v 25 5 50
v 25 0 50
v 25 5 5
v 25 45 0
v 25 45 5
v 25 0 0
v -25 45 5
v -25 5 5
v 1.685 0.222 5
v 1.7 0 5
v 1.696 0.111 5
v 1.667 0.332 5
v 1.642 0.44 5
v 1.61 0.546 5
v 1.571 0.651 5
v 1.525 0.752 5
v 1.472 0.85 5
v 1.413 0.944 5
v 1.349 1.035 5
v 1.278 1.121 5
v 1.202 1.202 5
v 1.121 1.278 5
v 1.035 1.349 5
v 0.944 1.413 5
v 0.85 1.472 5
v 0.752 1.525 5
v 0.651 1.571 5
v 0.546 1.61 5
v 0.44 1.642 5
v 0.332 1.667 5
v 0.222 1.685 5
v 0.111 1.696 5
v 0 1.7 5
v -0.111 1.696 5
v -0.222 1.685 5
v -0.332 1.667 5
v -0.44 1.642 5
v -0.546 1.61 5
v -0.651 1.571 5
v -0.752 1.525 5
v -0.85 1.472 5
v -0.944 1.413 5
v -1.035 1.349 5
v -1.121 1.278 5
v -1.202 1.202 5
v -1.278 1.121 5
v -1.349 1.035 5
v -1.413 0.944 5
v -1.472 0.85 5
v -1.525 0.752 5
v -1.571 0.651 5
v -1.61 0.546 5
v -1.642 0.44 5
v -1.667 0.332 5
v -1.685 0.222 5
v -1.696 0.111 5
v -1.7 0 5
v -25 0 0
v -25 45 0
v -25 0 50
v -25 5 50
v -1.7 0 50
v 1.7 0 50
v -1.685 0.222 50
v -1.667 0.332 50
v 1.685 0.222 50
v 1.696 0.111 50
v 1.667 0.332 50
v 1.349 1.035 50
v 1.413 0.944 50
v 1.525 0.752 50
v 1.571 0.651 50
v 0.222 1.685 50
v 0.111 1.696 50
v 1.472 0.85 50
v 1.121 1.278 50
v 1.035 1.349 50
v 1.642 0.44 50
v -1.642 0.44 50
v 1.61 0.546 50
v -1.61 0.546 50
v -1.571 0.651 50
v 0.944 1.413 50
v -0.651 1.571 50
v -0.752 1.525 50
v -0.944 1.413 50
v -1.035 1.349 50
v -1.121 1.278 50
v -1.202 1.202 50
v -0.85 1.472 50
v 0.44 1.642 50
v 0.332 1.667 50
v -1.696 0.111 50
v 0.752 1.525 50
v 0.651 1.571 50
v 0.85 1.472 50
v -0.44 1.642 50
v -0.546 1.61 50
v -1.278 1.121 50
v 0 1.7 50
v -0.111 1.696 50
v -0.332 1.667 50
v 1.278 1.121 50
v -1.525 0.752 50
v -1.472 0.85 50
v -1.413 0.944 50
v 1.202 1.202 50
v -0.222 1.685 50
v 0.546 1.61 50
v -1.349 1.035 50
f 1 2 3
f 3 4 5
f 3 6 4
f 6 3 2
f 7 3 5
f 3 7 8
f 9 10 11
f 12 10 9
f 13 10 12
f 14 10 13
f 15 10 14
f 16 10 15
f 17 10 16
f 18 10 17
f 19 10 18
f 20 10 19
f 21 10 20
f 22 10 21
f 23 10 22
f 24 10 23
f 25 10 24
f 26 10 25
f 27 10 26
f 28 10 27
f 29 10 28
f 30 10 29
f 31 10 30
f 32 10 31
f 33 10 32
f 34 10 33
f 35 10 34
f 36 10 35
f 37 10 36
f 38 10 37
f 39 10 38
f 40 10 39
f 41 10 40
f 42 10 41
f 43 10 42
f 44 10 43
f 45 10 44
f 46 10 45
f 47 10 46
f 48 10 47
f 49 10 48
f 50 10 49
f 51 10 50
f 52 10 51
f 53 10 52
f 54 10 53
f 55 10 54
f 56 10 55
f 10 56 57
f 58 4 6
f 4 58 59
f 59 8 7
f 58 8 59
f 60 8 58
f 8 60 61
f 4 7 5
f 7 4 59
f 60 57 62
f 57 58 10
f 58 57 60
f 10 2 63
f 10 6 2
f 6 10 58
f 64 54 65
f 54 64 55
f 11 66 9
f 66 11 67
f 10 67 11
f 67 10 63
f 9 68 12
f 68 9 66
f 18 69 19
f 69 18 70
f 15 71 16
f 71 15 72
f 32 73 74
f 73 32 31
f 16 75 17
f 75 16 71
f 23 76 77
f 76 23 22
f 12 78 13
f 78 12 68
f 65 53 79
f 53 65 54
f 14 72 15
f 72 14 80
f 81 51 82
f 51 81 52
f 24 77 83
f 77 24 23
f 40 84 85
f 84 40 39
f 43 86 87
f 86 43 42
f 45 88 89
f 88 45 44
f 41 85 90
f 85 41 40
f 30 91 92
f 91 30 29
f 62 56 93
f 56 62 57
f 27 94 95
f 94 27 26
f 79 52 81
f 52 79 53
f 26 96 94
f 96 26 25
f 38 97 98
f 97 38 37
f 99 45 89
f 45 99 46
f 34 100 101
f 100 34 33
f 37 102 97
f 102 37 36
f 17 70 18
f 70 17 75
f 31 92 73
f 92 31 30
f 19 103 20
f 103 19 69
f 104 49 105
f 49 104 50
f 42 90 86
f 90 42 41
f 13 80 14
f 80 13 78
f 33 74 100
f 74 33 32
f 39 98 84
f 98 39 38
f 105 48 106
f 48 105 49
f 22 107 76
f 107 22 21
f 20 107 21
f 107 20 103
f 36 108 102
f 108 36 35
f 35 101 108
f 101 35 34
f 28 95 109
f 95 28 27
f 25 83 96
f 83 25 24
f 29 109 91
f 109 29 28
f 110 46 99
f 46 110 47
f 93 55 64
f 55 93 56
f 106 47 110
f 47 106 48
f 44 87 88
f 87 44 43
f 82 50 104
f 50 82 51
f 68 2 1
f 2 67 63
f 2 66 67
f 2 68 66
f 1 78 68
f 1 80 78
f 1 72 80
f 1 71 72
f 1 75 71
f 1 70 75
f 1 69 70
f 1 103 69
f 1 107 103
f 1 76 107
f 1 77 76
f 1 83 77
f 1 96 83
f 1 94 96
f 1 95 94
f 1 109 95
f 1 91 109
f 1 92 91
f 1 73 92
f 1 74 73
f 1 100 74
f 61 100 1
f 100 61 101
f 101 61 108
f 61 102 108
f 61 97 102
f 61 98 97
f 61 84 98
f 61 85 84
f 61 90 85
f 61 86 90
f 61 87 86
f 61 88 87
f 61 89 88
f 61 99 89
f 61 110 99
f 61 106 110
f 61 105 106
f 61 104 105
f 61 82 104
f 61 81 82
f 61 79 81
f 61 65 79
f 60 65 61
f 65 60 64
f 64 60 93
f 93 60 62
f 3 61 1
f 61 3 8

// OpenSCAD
// L-shaped mounting bracket for NEMA 17 stepper motor (syringe pump)
// Print orientation: base plate on bed, motor plate building up in +Z

// ---------- Parameters ----------
base_x      = 50;    // base plate length in X (mm)
base_y      = 45;    // base plate width in Y (mm)
base_z      = 5;     // base plate thickness (mm)

motor_x     = 50;    // motor plate length in X (mm)
motor_y     = 5;     // motor plate width in Y (mm)
motor_z     = 50;    // motor plate height (mm)

hole_boss   = 23;    // motor boss hole diameter (mm)
hole_screw  = 3.4;   // M3 screw hole diameter (mm)
hole_count  = 4;     // number of screw holes
hole_pitch  = 31;    // screw hole pattern size (mm x mm)

gusset_t    = 5;     // gusset thickness (mm)
gusset_leg  = 20;    // gusset leg length (mm)

eps         = 0.5;   // cutter overshoot past faces (mm)

$fn = 96;

// ---------- Model ----------
union() {
    // Base plate with two M4 through-holes
    difference() {
        translate([-base_x/2, 0, 0])
            cube([base_x, base_y, base_z]);

        for (h = [30, -30])
            translate([h * 17 / 2, 30, -eps])
                cylinder(d = 4.5, h = base_z + 2 * eps);
    }

    // Motor plate with boss hole and four M3 screw holes
    difference() {
        translate([-motor_x/2, 0, 0])
            cube([motor_x, motor_y, motor_z]);

        translate([0, -eps, 28])
            rotate([90, 0, 0])
                cylinder(d = hole_boss, h = motor_y + 2 * eps);

        for (i = [0 : hole_count - 1]) {
            x = -hole_pitch / 2 + (i - (hole_count - 1) / 2) * hole_pitch / (hole_count - 1);
            y = -hole_pitch / 2 + (i - (hole_count - 1) / 2) * hole_pitch / (hole_count - 1);
            translate([x, y, -eps])
                cylinder(d = hole_screw, h = motor_z + 2 * eps);
        }
    }

    // Gussets on left and right edges (right-angle corner at y = 5, z = 5)
    for (sx = [-1, 1])
        translate([sx > 0 ? 20 : -25, 5, 5])
            rotate([90, 0, 0])
                linear_extrude(height = gusset_t)
                    polygon(points = [0, 0, gusset_leg, 0, 0, gusset_leg]);
}
